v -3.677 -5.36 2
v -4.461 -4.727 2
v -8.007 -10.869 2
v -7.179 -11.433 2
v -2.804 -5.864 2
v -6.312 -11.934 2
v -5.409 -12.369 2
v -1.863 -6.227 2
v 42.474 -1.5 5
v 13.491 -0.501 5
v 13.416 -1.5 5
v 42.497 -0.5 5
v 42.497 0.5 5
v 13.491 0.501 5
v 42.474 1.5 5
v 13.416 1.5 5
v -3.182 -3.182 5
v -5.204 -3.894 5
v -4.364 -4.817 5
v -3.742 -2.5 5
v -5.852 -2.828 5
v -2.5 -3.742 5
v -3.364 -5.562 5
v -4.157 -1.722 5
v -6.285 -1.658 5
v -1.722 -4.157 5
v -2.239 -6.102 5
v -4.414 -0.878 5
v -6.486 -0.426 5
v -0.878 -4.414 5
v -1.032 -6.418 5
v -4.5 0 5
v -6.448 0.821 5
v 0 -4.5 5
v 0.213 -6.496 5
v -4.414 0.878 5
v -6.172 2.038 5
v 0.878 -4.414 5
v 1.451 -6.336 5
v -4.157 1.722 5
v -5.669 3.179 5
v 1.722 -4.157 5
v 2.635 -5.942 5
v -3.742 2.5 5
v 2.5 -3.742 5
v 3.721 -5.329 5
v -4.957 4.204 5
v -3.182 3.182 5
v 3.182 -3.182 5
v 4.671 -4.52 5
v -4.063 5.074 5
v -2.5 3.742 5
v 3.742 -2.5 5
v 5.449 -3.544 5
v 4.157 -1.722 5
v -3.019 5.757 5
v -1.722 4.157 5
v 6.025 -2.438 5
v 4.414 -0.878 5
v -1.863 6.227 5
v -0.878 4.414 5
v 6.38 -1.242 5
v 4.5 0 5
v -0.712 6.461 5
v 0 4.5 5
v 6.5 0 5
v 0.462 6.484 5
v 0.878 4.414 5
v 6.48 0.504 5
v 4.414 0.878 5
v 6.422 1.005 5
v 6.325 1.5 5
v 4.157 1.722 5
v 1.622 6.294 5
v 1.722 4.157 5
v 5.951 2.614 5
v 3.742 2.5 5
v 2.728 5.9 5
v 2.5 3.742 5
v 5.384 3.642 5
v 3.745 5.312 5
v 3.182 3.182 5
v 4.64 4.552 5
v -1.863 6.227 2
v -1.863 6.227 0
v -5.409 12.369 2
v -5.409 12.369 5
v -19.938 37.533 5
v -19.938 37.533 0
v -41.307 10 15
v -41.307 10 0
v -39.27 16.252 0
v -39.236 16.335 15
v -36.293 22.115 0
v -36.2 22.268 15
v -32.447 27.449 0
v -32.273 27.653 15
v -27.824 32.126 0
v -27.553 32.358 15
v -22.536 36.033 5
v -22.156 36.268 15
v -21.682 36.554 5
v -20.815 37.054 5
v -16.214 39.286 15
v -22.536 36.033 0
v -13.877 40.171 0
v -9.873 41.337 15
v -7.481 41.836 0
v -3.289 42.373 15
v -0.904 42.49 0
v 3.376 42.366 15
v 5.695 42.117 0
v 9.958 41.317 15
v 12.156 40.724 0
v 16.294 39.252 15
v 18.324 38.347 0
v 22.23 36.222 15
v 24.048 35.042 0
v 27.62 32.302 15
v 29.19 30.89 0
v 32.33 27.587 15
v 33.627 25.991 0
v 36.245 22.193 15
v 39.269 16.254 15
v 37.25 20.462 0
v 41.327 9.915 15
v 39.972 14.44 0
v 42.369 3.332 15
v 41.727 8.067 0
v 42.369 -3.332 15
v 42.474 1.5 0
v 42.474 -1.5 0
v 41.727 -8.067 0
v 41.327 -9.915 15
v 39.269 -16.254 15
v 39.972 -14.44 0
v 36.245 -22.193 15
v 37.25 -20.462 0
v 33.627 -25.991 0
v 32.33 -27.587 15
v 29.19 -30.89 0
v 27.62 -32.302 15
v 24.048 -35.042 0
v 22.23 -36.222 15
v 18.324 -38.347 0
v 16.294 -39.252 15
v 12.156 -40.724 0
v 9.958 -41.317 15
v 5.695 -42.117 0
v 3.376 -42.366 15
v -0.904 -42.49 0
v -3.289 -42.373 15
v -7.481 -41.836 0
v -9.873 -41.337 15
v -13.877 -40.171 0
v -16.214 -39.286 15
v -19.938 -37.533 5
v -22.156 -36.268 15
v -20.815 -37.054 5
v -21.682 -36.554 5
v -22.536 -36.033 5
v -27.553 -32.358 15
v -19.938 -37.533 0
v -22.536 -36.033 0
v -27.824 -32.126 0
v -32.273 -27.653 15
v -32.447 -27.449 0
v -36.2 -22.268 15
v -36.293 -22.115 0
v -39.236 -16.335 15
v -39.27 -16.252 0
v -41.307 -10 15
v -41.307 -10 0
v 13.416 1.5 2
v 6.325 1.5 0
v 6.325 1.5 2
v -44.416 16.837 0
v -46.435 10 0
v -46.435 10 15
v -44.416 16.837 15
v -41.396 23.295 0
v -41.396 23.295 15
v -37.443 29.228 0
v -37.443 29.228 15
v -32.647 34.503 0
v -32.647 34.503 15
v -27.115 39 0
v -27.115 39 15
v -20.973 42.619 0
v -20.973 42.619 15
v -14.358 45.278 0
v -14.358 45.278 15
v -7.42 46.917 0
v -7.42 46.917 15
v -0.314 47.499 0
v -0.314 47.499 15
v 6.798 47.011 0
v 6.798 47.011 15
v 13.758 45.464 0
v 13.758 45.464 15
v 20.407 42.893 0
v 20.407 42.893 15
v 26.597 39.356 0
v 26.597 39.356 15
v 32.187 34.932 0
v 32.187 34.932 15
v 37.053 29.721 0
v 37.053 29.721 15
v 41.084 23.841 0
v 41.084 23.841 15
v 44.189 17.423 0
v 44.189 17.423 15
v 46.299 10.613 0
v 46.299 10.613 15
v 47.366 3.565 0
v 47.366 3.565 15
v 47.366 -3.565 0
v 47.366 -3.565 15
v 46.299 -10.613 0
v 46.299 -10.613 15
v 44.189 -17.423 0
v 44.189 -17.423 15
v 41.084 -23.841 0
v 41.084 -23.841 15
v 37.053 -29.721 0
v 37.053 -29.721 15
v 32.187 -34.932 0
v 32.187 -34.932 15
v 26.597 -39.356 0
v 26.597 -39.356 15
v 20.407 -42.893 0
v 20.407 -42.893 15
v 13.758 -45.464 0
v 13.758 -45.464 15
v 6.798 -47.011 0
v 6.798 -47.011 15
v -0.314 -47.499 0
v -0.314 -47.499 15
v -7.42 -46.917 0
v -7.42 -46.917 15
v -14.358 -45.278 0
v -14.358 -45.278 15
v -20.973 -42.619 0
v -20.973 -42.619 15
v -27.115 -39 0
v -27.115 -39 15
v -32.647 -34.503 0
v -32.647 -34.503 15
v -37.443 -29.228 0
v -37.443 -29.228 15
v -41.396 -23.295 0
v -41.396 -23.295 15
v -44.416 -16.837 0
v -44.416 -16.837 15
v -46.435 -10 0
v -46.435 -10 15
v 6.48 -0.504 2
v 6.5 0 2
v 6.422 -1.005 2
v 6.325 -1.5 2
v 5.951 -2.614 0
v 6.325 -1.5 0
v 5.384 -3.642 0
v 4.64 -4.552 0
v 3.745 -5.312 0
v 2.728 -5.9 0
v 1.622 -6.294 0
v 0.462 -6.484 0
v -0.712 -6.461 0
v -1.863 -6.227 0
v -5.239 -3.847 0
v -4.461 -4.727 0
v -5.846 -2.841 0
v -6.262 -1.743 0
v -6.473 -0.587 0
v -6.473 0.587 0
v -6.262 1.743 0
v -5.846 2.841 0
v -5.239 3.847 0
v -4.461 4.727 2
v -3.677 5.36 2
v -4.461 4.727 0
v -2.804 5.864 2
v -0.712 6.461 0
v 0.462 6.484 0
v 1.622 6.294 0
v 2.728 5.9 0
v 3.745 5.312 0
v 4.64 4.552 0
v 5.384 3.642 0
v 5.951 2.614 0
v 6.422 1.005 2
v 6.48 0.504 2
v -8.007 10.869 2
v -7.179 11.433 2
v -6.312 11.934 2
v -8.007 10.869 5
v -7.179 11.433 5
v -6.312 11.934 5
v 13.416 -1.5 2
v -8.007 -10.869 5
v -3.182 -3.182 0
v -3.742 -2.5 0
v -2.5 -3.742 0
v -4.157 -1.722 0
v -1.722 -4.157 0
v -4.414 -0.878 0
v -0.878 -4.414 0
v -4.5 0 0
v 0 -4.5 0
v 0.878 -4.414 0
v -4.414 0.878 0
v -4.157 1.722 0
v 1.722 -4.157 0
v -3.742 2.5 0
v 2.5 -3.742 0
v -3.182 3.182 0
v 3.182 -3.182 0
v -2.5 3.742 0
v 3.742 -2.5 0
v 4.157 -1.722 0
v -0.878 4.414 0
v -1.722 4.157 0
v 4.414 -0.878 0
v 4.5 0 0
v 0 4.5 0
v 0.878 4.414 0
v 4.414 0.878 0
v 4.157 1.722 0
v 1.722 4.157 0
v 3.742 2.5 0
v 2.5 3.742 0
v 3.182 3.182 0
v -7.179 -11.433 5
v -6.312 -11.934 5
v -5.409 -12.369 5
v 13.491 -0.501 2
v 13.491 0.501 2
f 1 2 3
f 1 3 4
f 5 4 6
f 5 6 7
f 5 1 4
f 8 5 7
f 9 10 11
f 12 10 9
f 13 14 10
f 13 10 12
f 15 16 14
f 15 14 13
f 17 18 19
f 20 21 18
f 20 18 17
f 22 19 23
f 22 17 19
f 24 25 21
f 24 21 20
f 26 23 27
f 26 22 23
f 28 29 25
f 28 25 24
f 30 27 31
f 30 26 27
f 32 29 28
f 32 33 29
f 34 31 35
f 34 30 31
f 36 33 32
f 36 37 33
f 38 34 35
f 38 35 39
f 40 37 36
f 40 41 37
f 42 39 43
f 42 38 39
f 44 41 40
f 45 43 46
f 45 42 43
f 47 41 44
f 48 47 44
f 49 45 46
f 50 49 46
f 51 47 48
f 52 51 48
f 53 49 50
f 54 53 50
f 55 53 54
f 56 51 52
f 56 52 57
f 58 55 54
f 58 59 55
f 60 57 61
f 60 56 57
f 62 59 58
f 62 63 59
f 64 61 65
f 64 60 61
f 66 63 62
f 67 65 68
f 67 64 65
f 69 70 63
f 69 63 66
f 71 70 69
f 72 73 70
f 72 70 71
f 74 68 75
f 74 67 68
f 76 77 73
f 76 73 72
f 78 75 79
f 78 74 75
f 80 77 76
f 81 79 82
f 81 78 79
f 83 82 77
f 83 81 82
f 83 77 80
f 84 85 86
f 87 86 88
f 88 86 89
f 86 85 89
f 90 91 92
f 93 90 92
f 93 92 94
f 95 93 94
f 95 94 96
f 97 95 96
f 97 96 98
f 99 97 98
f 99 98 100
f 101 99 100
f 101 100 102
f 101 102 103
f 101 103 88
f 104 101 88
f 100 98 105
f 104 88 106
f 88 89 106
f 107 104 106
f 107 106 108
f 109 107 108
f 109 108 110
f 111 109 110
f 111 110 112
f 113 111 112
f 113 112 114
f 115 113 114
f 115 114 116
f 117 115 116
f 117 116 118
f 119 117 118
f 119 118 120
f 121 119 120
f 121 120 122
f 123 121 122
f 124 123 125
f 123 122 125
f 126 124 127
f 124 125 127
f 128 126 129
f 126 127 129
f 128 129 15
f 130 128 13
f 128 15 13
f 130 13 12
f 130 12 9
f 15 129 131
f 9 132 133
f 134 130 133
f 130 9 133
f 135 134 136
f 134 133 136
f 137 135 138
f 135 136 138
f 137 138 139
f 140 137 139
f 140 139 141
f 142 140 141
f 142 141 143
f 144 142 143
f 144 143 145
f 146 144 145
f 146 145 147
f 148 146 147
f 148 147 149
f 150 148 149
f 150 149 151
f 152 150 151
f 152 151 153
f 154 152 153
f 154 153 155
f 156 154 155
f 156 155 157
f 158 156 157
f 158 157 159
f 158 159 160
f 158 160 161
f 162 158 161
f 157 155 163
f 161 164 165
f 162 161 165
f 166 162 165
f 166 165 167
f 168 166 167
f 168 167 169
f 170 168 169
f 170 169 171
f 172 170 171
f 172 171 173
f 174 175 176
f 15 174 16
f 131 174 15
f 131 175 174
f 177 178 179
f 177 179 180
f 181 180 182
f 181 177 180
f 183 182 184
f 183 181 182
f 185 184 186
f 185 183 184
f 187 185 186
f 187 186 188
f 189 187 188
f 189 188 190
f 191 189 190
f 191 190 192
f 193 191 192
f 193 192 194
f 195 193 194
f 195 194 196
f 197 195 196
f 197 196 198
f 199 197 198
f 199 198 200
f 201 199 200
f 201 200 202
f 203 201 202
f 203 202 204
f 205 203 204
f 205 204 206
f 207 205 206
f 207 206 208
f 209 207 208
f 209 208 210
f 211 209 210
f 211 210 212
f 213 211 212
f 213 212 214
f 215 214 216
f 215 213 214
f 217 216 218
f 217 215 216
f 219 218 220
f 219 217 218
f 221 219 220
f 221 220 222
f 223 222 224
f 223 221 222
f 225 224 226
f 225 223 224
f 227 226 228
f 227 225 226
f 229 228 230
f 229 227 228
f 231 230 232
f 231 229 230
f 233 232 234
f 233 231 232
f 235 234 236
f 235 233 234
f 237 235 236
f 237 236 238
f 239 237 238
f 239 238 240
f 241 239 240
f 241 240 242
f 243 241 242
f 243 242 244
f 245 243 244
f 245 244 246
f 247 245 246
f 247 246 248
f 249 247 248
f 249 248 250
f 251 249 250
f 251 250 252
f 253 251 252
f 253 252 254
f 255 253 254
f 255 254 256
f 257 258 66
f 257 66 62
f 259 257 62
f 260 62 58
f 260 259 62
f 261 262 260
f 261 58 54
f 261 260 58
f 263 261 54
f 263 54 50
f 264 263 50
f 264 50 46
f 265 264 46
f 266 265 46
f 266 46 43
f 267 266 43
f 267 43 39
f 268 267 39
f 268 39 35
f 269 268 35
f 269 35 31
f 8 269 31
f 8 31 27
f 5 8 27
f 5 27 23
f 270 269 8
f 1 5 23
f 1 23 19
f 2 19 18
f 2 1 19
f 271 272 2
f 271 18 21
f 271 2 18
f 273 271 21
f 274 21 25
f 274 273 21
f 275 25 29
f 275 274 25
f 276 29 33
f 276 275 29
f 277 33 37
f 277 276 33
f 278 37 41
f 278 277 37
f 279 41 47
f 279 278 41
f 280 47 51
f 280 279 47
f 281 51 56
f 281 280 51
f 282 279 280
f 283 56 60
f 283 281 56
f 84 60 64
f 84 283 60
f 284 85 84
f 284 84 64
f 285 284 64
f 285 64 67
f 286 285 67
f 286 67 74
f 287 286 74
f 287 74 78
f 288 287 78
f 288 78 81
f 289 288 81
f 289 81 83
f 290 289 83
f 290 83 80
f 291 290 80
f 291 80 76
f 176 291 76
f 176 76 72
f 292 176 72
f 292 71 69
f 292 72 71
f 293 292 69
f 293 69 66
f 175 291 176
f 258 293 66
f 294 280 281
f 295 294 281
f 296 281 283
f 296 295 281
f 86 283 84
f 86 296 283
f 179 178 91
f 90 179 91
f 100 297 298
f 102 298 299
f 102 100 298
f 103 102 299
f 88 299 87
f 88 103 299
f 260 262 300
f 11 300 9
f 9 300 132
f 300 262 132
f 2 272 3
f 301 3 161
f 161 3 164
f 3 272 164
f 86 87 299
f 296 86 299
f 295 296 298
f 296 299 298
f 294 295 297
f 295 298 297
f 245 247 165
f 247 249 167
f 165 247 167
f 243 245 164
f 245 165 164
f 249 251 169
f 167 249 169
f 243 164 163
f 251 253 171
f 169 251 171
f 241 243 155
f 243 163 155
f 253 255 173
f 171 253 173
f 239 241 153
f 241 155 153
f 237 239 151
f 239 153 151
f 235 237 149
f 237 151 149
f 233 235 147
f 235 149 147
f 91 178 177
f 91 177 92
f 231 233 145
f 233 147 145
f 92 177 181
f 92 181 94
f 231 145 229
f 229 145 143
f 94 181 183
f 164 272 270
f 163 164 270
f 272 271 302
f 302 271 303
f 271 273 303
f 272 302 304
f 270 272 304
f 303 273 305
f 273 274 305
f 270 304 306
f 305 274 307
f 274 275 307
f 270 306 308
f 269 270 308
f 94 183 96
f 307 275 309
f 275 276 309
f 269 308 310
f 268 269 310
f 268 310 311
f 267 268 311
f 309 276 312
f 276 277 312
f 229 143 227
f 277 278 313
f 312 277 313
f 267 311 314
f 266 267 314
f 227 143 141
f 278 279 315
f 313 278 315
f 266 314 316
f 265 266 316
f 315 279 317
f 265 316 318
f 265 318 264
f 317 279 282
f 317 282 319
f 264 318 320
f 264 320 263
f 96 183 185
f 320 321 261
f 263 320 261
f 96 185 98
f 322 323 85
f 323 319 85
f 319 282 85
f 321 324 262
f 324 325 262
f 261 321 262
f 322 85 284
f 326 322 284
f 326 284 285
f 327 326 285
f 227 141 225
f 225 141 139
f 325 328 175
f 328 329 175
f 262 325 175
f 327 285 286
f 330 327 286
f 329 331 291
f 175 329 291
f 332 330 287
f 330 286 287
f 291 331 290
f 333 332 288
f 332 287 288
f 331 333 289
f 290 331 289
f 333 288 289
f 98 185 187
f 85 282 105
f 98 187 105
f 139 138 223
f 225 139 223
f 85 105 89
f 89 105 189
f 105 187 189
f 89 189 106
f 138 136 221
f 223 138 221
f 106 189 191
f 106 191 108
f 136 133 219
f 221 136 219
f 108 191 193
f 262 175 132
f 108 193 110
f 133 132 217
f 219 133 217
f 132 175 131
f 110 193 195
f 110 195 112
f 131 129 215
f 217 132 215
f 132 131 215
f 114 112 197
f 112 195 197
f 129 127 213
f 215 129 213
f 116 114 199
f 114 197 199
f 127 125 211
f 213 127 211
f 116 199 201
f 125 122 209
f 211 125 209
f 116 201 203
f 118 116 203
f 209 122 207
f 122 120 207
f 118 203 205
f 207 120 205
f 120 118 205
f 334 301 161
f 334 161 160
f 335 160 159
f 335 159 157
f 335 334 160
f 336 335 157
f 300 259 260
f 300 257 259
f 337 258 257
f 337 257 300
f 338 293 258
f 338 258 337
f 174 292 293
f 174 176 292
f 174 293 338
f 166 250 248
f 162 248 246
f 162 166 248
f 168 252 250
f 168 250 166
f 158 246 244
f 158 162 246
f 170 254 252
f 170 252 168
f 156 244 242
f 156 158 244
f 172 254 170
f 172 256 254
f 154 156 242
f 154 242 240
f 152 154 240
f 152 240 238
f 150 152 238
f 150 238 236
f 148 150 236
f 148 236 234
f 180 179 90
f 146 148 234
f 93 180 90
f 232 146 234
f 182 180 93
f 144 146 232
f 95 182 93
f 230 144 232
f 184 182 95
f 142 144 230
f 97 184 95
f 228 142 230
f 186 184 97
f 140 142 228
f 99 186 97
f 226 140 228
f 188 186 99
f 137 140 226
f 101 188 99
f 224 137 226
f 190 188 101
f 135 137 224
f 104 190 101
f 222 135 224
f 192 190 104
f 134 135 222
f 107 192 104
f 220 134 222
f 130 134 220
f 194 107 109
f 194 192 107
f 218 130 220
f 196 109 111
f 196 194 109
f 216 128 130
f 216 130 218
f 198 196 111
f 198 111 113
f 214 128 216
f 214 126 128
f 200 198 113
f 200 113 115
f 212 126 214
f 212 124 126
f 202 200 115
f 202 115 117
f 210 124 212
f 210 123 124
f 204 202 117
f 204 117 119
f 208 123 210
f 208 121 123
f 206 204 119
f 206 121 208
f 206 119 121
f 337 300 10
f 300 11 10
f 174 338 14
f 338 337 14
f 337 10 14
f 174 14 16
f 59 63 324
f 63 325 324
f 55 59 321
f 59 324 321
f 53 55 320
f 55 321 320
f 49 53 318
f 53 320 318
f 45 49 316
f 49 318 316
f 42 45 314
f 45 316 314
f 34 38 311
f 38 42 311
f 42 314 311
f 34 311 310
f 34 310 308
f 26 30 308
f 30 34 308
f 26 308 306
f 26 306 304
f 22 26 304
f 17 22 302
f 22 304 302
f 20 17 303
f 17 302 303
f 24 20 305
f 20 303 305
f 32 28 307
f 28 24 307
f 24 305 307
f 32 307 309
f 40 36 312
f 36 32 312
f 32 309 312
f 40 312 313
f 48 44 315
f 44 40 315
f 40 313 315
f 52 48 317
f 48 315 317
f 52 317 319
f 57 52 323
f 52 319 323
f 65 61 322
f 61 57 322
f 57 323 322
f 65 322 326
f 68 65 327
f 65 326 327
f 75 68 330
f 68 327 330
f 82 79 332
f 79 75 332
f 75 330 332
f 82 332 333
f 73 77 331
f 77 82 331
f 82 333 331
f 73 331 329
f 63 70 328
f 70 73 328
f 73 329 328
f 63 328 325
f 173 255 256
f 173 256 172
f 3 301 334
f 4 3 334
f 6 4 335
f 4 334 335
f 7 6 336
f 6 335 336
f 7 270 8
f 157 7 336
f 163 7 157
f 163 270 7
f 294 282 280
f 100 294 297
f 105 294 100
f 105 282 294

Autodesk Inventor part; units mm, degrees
ref_plane "YZ Plane" through (0, 0, 0) normal (1, 0, 0) x (0, 1, 0)
ref_plane "XZ Plane" through (0, 0, 0) normal (0, 1, 0) x (-1, 0, 0)
ref_plane "XY Plane" through (0, 0, 0) normal (0, 0, 1) x (1, 0, 0)
sketch "Sketch1" plane through (0, 0, 0) normal (0, 0, 1) x (1, 0, 0)
  circle A0 centre (0, 0) radius 47.5 construction
  line L0 (-46.4354, 10) -> (-46.4354, -10) construction
  circle A1 centre (0, 0) radius 42.5 construction
  line L1 (-46.4354, 10) -> (-41.3068, 10)
  line L2 (-46.4354, -10) -> (-41.3068, -10)
  arc A2 (-46.4354, -10) -> (-46.4354, 10) centre (0, 0) ccw
  arc A3 (-41.3068, -10) -> (-41.3068, 10) centre (0, 0) ccw
  circle A4 centre (0, 0) radius 4.5
  circle A5 centre (0, 0) radius 6.5
  line L3 (4.2426, 1.5) -> (47.4763, 1.5)
  line L4 (4.2426, -1.5) -> (47.4763, -1.5)
  arc A6 (4.2426, -1.5) -> (4.2426, 1.5) centre (0, 0) ccw
  arc A7 (47.4763, -1.5) -> (47.4763, 1.5) centre (0, 0) ccw
  line L5 (-3.4204, 2.9242) -> (-25.0372, 40.3657)
  line L6 (-0.8223, 4.4242) -> (-22.4391, 41.8657)
  line L7 (-0.8223, -4.4242) -> (-22.4391, -41.8657)
  line L8 (-3.4204, -2.9242) -> (-25.0372, -40.3657)
  arc A8 (-0.8223, 4.4242) -> (-3.4204, 2.9242) centre (0, 0) ccw
  arc A9 (-3.4204, -2.9242) -> (-0.8223, -4.4242) centre (0, 0) ccw
  arc A10 (-22.4391, 41.8657) -> (-25.0372, 40.3657) centre (0, 0) ccw
  arc A11 (-25.0372, -40.3657) -> (-22.4391, -41.8657) centre (0, 0) ccw
  point P0 (-46.4354, 0)
  dimension "d0" = 95
  dimension "d1" = 20
  dimension "d2" = 5
  dimension "d5" = 9
  dimension "d7" = 3
  dimension "d10" = 360
  dimension "d17" = 13
extrude "Extrusion1" add sketch "Sketch1" along normal blind 15 contours A2 L5 A3 L1 | A2 L6 A3 L5 | A2 L3 A3 L6 | L5 A4 L8 A5 | A5 L6 A4 L5 | A2 L4 A3 L3 | A5 L3 A4 L6 | L8 A4 L7 A5 | A2 L7 A3 L4 | A5 L4 A4 L3 | L7 A4 L4 A5 | L8 A2 L2 A3 | A3 L7 A2 L8
extrude "Extrusion2" add sketch "Sketch1" along normal blind 5 contours A2 L6 A3 L5 | A3 L6 A5 L5 | A5 L6 A4 L5 | A2 L4 A3 L3 | A3 L4 A5 L3 | L8 A4 L7 A5 | A5 L7 A3 L8 | A5 L4 A4 L3 | A3 L7 A2 L8
sketch "Sketch3" plane through (0, 0, 15) normal (0, 0, 1) x (1, 0, 0)
  circle A0 centre (0, 0) radius 4.5 projected
  circle A1 centre (0, 0) radius 6.5 projected
  point P0 (0, 0)
extrude "Extrusion3" cut sketch "Sketch3" against normal blind 10
sketch "Sketch4" plane through (0, 0, 5) normal (0, 0, 1) x (1, 0, 0)
  arc A0 (6.3246, 1.5) -> (-1.8632, 6.2272) centre (0, 0) ccw projected
  line L0 (42.4735, 1.5) -> (6.3246, 1.5) projected
  circle A1 centre (0, 0) radius 6.5
  circle A2 centre (0, 0) radius 13.5
  point P0 (0, 0)
  dimension "d18" = 27
extrude "Extrusion4" cut sketch "Sketch4" against normal blind 3
properties part number "AA051" material "ABS Plastic"
